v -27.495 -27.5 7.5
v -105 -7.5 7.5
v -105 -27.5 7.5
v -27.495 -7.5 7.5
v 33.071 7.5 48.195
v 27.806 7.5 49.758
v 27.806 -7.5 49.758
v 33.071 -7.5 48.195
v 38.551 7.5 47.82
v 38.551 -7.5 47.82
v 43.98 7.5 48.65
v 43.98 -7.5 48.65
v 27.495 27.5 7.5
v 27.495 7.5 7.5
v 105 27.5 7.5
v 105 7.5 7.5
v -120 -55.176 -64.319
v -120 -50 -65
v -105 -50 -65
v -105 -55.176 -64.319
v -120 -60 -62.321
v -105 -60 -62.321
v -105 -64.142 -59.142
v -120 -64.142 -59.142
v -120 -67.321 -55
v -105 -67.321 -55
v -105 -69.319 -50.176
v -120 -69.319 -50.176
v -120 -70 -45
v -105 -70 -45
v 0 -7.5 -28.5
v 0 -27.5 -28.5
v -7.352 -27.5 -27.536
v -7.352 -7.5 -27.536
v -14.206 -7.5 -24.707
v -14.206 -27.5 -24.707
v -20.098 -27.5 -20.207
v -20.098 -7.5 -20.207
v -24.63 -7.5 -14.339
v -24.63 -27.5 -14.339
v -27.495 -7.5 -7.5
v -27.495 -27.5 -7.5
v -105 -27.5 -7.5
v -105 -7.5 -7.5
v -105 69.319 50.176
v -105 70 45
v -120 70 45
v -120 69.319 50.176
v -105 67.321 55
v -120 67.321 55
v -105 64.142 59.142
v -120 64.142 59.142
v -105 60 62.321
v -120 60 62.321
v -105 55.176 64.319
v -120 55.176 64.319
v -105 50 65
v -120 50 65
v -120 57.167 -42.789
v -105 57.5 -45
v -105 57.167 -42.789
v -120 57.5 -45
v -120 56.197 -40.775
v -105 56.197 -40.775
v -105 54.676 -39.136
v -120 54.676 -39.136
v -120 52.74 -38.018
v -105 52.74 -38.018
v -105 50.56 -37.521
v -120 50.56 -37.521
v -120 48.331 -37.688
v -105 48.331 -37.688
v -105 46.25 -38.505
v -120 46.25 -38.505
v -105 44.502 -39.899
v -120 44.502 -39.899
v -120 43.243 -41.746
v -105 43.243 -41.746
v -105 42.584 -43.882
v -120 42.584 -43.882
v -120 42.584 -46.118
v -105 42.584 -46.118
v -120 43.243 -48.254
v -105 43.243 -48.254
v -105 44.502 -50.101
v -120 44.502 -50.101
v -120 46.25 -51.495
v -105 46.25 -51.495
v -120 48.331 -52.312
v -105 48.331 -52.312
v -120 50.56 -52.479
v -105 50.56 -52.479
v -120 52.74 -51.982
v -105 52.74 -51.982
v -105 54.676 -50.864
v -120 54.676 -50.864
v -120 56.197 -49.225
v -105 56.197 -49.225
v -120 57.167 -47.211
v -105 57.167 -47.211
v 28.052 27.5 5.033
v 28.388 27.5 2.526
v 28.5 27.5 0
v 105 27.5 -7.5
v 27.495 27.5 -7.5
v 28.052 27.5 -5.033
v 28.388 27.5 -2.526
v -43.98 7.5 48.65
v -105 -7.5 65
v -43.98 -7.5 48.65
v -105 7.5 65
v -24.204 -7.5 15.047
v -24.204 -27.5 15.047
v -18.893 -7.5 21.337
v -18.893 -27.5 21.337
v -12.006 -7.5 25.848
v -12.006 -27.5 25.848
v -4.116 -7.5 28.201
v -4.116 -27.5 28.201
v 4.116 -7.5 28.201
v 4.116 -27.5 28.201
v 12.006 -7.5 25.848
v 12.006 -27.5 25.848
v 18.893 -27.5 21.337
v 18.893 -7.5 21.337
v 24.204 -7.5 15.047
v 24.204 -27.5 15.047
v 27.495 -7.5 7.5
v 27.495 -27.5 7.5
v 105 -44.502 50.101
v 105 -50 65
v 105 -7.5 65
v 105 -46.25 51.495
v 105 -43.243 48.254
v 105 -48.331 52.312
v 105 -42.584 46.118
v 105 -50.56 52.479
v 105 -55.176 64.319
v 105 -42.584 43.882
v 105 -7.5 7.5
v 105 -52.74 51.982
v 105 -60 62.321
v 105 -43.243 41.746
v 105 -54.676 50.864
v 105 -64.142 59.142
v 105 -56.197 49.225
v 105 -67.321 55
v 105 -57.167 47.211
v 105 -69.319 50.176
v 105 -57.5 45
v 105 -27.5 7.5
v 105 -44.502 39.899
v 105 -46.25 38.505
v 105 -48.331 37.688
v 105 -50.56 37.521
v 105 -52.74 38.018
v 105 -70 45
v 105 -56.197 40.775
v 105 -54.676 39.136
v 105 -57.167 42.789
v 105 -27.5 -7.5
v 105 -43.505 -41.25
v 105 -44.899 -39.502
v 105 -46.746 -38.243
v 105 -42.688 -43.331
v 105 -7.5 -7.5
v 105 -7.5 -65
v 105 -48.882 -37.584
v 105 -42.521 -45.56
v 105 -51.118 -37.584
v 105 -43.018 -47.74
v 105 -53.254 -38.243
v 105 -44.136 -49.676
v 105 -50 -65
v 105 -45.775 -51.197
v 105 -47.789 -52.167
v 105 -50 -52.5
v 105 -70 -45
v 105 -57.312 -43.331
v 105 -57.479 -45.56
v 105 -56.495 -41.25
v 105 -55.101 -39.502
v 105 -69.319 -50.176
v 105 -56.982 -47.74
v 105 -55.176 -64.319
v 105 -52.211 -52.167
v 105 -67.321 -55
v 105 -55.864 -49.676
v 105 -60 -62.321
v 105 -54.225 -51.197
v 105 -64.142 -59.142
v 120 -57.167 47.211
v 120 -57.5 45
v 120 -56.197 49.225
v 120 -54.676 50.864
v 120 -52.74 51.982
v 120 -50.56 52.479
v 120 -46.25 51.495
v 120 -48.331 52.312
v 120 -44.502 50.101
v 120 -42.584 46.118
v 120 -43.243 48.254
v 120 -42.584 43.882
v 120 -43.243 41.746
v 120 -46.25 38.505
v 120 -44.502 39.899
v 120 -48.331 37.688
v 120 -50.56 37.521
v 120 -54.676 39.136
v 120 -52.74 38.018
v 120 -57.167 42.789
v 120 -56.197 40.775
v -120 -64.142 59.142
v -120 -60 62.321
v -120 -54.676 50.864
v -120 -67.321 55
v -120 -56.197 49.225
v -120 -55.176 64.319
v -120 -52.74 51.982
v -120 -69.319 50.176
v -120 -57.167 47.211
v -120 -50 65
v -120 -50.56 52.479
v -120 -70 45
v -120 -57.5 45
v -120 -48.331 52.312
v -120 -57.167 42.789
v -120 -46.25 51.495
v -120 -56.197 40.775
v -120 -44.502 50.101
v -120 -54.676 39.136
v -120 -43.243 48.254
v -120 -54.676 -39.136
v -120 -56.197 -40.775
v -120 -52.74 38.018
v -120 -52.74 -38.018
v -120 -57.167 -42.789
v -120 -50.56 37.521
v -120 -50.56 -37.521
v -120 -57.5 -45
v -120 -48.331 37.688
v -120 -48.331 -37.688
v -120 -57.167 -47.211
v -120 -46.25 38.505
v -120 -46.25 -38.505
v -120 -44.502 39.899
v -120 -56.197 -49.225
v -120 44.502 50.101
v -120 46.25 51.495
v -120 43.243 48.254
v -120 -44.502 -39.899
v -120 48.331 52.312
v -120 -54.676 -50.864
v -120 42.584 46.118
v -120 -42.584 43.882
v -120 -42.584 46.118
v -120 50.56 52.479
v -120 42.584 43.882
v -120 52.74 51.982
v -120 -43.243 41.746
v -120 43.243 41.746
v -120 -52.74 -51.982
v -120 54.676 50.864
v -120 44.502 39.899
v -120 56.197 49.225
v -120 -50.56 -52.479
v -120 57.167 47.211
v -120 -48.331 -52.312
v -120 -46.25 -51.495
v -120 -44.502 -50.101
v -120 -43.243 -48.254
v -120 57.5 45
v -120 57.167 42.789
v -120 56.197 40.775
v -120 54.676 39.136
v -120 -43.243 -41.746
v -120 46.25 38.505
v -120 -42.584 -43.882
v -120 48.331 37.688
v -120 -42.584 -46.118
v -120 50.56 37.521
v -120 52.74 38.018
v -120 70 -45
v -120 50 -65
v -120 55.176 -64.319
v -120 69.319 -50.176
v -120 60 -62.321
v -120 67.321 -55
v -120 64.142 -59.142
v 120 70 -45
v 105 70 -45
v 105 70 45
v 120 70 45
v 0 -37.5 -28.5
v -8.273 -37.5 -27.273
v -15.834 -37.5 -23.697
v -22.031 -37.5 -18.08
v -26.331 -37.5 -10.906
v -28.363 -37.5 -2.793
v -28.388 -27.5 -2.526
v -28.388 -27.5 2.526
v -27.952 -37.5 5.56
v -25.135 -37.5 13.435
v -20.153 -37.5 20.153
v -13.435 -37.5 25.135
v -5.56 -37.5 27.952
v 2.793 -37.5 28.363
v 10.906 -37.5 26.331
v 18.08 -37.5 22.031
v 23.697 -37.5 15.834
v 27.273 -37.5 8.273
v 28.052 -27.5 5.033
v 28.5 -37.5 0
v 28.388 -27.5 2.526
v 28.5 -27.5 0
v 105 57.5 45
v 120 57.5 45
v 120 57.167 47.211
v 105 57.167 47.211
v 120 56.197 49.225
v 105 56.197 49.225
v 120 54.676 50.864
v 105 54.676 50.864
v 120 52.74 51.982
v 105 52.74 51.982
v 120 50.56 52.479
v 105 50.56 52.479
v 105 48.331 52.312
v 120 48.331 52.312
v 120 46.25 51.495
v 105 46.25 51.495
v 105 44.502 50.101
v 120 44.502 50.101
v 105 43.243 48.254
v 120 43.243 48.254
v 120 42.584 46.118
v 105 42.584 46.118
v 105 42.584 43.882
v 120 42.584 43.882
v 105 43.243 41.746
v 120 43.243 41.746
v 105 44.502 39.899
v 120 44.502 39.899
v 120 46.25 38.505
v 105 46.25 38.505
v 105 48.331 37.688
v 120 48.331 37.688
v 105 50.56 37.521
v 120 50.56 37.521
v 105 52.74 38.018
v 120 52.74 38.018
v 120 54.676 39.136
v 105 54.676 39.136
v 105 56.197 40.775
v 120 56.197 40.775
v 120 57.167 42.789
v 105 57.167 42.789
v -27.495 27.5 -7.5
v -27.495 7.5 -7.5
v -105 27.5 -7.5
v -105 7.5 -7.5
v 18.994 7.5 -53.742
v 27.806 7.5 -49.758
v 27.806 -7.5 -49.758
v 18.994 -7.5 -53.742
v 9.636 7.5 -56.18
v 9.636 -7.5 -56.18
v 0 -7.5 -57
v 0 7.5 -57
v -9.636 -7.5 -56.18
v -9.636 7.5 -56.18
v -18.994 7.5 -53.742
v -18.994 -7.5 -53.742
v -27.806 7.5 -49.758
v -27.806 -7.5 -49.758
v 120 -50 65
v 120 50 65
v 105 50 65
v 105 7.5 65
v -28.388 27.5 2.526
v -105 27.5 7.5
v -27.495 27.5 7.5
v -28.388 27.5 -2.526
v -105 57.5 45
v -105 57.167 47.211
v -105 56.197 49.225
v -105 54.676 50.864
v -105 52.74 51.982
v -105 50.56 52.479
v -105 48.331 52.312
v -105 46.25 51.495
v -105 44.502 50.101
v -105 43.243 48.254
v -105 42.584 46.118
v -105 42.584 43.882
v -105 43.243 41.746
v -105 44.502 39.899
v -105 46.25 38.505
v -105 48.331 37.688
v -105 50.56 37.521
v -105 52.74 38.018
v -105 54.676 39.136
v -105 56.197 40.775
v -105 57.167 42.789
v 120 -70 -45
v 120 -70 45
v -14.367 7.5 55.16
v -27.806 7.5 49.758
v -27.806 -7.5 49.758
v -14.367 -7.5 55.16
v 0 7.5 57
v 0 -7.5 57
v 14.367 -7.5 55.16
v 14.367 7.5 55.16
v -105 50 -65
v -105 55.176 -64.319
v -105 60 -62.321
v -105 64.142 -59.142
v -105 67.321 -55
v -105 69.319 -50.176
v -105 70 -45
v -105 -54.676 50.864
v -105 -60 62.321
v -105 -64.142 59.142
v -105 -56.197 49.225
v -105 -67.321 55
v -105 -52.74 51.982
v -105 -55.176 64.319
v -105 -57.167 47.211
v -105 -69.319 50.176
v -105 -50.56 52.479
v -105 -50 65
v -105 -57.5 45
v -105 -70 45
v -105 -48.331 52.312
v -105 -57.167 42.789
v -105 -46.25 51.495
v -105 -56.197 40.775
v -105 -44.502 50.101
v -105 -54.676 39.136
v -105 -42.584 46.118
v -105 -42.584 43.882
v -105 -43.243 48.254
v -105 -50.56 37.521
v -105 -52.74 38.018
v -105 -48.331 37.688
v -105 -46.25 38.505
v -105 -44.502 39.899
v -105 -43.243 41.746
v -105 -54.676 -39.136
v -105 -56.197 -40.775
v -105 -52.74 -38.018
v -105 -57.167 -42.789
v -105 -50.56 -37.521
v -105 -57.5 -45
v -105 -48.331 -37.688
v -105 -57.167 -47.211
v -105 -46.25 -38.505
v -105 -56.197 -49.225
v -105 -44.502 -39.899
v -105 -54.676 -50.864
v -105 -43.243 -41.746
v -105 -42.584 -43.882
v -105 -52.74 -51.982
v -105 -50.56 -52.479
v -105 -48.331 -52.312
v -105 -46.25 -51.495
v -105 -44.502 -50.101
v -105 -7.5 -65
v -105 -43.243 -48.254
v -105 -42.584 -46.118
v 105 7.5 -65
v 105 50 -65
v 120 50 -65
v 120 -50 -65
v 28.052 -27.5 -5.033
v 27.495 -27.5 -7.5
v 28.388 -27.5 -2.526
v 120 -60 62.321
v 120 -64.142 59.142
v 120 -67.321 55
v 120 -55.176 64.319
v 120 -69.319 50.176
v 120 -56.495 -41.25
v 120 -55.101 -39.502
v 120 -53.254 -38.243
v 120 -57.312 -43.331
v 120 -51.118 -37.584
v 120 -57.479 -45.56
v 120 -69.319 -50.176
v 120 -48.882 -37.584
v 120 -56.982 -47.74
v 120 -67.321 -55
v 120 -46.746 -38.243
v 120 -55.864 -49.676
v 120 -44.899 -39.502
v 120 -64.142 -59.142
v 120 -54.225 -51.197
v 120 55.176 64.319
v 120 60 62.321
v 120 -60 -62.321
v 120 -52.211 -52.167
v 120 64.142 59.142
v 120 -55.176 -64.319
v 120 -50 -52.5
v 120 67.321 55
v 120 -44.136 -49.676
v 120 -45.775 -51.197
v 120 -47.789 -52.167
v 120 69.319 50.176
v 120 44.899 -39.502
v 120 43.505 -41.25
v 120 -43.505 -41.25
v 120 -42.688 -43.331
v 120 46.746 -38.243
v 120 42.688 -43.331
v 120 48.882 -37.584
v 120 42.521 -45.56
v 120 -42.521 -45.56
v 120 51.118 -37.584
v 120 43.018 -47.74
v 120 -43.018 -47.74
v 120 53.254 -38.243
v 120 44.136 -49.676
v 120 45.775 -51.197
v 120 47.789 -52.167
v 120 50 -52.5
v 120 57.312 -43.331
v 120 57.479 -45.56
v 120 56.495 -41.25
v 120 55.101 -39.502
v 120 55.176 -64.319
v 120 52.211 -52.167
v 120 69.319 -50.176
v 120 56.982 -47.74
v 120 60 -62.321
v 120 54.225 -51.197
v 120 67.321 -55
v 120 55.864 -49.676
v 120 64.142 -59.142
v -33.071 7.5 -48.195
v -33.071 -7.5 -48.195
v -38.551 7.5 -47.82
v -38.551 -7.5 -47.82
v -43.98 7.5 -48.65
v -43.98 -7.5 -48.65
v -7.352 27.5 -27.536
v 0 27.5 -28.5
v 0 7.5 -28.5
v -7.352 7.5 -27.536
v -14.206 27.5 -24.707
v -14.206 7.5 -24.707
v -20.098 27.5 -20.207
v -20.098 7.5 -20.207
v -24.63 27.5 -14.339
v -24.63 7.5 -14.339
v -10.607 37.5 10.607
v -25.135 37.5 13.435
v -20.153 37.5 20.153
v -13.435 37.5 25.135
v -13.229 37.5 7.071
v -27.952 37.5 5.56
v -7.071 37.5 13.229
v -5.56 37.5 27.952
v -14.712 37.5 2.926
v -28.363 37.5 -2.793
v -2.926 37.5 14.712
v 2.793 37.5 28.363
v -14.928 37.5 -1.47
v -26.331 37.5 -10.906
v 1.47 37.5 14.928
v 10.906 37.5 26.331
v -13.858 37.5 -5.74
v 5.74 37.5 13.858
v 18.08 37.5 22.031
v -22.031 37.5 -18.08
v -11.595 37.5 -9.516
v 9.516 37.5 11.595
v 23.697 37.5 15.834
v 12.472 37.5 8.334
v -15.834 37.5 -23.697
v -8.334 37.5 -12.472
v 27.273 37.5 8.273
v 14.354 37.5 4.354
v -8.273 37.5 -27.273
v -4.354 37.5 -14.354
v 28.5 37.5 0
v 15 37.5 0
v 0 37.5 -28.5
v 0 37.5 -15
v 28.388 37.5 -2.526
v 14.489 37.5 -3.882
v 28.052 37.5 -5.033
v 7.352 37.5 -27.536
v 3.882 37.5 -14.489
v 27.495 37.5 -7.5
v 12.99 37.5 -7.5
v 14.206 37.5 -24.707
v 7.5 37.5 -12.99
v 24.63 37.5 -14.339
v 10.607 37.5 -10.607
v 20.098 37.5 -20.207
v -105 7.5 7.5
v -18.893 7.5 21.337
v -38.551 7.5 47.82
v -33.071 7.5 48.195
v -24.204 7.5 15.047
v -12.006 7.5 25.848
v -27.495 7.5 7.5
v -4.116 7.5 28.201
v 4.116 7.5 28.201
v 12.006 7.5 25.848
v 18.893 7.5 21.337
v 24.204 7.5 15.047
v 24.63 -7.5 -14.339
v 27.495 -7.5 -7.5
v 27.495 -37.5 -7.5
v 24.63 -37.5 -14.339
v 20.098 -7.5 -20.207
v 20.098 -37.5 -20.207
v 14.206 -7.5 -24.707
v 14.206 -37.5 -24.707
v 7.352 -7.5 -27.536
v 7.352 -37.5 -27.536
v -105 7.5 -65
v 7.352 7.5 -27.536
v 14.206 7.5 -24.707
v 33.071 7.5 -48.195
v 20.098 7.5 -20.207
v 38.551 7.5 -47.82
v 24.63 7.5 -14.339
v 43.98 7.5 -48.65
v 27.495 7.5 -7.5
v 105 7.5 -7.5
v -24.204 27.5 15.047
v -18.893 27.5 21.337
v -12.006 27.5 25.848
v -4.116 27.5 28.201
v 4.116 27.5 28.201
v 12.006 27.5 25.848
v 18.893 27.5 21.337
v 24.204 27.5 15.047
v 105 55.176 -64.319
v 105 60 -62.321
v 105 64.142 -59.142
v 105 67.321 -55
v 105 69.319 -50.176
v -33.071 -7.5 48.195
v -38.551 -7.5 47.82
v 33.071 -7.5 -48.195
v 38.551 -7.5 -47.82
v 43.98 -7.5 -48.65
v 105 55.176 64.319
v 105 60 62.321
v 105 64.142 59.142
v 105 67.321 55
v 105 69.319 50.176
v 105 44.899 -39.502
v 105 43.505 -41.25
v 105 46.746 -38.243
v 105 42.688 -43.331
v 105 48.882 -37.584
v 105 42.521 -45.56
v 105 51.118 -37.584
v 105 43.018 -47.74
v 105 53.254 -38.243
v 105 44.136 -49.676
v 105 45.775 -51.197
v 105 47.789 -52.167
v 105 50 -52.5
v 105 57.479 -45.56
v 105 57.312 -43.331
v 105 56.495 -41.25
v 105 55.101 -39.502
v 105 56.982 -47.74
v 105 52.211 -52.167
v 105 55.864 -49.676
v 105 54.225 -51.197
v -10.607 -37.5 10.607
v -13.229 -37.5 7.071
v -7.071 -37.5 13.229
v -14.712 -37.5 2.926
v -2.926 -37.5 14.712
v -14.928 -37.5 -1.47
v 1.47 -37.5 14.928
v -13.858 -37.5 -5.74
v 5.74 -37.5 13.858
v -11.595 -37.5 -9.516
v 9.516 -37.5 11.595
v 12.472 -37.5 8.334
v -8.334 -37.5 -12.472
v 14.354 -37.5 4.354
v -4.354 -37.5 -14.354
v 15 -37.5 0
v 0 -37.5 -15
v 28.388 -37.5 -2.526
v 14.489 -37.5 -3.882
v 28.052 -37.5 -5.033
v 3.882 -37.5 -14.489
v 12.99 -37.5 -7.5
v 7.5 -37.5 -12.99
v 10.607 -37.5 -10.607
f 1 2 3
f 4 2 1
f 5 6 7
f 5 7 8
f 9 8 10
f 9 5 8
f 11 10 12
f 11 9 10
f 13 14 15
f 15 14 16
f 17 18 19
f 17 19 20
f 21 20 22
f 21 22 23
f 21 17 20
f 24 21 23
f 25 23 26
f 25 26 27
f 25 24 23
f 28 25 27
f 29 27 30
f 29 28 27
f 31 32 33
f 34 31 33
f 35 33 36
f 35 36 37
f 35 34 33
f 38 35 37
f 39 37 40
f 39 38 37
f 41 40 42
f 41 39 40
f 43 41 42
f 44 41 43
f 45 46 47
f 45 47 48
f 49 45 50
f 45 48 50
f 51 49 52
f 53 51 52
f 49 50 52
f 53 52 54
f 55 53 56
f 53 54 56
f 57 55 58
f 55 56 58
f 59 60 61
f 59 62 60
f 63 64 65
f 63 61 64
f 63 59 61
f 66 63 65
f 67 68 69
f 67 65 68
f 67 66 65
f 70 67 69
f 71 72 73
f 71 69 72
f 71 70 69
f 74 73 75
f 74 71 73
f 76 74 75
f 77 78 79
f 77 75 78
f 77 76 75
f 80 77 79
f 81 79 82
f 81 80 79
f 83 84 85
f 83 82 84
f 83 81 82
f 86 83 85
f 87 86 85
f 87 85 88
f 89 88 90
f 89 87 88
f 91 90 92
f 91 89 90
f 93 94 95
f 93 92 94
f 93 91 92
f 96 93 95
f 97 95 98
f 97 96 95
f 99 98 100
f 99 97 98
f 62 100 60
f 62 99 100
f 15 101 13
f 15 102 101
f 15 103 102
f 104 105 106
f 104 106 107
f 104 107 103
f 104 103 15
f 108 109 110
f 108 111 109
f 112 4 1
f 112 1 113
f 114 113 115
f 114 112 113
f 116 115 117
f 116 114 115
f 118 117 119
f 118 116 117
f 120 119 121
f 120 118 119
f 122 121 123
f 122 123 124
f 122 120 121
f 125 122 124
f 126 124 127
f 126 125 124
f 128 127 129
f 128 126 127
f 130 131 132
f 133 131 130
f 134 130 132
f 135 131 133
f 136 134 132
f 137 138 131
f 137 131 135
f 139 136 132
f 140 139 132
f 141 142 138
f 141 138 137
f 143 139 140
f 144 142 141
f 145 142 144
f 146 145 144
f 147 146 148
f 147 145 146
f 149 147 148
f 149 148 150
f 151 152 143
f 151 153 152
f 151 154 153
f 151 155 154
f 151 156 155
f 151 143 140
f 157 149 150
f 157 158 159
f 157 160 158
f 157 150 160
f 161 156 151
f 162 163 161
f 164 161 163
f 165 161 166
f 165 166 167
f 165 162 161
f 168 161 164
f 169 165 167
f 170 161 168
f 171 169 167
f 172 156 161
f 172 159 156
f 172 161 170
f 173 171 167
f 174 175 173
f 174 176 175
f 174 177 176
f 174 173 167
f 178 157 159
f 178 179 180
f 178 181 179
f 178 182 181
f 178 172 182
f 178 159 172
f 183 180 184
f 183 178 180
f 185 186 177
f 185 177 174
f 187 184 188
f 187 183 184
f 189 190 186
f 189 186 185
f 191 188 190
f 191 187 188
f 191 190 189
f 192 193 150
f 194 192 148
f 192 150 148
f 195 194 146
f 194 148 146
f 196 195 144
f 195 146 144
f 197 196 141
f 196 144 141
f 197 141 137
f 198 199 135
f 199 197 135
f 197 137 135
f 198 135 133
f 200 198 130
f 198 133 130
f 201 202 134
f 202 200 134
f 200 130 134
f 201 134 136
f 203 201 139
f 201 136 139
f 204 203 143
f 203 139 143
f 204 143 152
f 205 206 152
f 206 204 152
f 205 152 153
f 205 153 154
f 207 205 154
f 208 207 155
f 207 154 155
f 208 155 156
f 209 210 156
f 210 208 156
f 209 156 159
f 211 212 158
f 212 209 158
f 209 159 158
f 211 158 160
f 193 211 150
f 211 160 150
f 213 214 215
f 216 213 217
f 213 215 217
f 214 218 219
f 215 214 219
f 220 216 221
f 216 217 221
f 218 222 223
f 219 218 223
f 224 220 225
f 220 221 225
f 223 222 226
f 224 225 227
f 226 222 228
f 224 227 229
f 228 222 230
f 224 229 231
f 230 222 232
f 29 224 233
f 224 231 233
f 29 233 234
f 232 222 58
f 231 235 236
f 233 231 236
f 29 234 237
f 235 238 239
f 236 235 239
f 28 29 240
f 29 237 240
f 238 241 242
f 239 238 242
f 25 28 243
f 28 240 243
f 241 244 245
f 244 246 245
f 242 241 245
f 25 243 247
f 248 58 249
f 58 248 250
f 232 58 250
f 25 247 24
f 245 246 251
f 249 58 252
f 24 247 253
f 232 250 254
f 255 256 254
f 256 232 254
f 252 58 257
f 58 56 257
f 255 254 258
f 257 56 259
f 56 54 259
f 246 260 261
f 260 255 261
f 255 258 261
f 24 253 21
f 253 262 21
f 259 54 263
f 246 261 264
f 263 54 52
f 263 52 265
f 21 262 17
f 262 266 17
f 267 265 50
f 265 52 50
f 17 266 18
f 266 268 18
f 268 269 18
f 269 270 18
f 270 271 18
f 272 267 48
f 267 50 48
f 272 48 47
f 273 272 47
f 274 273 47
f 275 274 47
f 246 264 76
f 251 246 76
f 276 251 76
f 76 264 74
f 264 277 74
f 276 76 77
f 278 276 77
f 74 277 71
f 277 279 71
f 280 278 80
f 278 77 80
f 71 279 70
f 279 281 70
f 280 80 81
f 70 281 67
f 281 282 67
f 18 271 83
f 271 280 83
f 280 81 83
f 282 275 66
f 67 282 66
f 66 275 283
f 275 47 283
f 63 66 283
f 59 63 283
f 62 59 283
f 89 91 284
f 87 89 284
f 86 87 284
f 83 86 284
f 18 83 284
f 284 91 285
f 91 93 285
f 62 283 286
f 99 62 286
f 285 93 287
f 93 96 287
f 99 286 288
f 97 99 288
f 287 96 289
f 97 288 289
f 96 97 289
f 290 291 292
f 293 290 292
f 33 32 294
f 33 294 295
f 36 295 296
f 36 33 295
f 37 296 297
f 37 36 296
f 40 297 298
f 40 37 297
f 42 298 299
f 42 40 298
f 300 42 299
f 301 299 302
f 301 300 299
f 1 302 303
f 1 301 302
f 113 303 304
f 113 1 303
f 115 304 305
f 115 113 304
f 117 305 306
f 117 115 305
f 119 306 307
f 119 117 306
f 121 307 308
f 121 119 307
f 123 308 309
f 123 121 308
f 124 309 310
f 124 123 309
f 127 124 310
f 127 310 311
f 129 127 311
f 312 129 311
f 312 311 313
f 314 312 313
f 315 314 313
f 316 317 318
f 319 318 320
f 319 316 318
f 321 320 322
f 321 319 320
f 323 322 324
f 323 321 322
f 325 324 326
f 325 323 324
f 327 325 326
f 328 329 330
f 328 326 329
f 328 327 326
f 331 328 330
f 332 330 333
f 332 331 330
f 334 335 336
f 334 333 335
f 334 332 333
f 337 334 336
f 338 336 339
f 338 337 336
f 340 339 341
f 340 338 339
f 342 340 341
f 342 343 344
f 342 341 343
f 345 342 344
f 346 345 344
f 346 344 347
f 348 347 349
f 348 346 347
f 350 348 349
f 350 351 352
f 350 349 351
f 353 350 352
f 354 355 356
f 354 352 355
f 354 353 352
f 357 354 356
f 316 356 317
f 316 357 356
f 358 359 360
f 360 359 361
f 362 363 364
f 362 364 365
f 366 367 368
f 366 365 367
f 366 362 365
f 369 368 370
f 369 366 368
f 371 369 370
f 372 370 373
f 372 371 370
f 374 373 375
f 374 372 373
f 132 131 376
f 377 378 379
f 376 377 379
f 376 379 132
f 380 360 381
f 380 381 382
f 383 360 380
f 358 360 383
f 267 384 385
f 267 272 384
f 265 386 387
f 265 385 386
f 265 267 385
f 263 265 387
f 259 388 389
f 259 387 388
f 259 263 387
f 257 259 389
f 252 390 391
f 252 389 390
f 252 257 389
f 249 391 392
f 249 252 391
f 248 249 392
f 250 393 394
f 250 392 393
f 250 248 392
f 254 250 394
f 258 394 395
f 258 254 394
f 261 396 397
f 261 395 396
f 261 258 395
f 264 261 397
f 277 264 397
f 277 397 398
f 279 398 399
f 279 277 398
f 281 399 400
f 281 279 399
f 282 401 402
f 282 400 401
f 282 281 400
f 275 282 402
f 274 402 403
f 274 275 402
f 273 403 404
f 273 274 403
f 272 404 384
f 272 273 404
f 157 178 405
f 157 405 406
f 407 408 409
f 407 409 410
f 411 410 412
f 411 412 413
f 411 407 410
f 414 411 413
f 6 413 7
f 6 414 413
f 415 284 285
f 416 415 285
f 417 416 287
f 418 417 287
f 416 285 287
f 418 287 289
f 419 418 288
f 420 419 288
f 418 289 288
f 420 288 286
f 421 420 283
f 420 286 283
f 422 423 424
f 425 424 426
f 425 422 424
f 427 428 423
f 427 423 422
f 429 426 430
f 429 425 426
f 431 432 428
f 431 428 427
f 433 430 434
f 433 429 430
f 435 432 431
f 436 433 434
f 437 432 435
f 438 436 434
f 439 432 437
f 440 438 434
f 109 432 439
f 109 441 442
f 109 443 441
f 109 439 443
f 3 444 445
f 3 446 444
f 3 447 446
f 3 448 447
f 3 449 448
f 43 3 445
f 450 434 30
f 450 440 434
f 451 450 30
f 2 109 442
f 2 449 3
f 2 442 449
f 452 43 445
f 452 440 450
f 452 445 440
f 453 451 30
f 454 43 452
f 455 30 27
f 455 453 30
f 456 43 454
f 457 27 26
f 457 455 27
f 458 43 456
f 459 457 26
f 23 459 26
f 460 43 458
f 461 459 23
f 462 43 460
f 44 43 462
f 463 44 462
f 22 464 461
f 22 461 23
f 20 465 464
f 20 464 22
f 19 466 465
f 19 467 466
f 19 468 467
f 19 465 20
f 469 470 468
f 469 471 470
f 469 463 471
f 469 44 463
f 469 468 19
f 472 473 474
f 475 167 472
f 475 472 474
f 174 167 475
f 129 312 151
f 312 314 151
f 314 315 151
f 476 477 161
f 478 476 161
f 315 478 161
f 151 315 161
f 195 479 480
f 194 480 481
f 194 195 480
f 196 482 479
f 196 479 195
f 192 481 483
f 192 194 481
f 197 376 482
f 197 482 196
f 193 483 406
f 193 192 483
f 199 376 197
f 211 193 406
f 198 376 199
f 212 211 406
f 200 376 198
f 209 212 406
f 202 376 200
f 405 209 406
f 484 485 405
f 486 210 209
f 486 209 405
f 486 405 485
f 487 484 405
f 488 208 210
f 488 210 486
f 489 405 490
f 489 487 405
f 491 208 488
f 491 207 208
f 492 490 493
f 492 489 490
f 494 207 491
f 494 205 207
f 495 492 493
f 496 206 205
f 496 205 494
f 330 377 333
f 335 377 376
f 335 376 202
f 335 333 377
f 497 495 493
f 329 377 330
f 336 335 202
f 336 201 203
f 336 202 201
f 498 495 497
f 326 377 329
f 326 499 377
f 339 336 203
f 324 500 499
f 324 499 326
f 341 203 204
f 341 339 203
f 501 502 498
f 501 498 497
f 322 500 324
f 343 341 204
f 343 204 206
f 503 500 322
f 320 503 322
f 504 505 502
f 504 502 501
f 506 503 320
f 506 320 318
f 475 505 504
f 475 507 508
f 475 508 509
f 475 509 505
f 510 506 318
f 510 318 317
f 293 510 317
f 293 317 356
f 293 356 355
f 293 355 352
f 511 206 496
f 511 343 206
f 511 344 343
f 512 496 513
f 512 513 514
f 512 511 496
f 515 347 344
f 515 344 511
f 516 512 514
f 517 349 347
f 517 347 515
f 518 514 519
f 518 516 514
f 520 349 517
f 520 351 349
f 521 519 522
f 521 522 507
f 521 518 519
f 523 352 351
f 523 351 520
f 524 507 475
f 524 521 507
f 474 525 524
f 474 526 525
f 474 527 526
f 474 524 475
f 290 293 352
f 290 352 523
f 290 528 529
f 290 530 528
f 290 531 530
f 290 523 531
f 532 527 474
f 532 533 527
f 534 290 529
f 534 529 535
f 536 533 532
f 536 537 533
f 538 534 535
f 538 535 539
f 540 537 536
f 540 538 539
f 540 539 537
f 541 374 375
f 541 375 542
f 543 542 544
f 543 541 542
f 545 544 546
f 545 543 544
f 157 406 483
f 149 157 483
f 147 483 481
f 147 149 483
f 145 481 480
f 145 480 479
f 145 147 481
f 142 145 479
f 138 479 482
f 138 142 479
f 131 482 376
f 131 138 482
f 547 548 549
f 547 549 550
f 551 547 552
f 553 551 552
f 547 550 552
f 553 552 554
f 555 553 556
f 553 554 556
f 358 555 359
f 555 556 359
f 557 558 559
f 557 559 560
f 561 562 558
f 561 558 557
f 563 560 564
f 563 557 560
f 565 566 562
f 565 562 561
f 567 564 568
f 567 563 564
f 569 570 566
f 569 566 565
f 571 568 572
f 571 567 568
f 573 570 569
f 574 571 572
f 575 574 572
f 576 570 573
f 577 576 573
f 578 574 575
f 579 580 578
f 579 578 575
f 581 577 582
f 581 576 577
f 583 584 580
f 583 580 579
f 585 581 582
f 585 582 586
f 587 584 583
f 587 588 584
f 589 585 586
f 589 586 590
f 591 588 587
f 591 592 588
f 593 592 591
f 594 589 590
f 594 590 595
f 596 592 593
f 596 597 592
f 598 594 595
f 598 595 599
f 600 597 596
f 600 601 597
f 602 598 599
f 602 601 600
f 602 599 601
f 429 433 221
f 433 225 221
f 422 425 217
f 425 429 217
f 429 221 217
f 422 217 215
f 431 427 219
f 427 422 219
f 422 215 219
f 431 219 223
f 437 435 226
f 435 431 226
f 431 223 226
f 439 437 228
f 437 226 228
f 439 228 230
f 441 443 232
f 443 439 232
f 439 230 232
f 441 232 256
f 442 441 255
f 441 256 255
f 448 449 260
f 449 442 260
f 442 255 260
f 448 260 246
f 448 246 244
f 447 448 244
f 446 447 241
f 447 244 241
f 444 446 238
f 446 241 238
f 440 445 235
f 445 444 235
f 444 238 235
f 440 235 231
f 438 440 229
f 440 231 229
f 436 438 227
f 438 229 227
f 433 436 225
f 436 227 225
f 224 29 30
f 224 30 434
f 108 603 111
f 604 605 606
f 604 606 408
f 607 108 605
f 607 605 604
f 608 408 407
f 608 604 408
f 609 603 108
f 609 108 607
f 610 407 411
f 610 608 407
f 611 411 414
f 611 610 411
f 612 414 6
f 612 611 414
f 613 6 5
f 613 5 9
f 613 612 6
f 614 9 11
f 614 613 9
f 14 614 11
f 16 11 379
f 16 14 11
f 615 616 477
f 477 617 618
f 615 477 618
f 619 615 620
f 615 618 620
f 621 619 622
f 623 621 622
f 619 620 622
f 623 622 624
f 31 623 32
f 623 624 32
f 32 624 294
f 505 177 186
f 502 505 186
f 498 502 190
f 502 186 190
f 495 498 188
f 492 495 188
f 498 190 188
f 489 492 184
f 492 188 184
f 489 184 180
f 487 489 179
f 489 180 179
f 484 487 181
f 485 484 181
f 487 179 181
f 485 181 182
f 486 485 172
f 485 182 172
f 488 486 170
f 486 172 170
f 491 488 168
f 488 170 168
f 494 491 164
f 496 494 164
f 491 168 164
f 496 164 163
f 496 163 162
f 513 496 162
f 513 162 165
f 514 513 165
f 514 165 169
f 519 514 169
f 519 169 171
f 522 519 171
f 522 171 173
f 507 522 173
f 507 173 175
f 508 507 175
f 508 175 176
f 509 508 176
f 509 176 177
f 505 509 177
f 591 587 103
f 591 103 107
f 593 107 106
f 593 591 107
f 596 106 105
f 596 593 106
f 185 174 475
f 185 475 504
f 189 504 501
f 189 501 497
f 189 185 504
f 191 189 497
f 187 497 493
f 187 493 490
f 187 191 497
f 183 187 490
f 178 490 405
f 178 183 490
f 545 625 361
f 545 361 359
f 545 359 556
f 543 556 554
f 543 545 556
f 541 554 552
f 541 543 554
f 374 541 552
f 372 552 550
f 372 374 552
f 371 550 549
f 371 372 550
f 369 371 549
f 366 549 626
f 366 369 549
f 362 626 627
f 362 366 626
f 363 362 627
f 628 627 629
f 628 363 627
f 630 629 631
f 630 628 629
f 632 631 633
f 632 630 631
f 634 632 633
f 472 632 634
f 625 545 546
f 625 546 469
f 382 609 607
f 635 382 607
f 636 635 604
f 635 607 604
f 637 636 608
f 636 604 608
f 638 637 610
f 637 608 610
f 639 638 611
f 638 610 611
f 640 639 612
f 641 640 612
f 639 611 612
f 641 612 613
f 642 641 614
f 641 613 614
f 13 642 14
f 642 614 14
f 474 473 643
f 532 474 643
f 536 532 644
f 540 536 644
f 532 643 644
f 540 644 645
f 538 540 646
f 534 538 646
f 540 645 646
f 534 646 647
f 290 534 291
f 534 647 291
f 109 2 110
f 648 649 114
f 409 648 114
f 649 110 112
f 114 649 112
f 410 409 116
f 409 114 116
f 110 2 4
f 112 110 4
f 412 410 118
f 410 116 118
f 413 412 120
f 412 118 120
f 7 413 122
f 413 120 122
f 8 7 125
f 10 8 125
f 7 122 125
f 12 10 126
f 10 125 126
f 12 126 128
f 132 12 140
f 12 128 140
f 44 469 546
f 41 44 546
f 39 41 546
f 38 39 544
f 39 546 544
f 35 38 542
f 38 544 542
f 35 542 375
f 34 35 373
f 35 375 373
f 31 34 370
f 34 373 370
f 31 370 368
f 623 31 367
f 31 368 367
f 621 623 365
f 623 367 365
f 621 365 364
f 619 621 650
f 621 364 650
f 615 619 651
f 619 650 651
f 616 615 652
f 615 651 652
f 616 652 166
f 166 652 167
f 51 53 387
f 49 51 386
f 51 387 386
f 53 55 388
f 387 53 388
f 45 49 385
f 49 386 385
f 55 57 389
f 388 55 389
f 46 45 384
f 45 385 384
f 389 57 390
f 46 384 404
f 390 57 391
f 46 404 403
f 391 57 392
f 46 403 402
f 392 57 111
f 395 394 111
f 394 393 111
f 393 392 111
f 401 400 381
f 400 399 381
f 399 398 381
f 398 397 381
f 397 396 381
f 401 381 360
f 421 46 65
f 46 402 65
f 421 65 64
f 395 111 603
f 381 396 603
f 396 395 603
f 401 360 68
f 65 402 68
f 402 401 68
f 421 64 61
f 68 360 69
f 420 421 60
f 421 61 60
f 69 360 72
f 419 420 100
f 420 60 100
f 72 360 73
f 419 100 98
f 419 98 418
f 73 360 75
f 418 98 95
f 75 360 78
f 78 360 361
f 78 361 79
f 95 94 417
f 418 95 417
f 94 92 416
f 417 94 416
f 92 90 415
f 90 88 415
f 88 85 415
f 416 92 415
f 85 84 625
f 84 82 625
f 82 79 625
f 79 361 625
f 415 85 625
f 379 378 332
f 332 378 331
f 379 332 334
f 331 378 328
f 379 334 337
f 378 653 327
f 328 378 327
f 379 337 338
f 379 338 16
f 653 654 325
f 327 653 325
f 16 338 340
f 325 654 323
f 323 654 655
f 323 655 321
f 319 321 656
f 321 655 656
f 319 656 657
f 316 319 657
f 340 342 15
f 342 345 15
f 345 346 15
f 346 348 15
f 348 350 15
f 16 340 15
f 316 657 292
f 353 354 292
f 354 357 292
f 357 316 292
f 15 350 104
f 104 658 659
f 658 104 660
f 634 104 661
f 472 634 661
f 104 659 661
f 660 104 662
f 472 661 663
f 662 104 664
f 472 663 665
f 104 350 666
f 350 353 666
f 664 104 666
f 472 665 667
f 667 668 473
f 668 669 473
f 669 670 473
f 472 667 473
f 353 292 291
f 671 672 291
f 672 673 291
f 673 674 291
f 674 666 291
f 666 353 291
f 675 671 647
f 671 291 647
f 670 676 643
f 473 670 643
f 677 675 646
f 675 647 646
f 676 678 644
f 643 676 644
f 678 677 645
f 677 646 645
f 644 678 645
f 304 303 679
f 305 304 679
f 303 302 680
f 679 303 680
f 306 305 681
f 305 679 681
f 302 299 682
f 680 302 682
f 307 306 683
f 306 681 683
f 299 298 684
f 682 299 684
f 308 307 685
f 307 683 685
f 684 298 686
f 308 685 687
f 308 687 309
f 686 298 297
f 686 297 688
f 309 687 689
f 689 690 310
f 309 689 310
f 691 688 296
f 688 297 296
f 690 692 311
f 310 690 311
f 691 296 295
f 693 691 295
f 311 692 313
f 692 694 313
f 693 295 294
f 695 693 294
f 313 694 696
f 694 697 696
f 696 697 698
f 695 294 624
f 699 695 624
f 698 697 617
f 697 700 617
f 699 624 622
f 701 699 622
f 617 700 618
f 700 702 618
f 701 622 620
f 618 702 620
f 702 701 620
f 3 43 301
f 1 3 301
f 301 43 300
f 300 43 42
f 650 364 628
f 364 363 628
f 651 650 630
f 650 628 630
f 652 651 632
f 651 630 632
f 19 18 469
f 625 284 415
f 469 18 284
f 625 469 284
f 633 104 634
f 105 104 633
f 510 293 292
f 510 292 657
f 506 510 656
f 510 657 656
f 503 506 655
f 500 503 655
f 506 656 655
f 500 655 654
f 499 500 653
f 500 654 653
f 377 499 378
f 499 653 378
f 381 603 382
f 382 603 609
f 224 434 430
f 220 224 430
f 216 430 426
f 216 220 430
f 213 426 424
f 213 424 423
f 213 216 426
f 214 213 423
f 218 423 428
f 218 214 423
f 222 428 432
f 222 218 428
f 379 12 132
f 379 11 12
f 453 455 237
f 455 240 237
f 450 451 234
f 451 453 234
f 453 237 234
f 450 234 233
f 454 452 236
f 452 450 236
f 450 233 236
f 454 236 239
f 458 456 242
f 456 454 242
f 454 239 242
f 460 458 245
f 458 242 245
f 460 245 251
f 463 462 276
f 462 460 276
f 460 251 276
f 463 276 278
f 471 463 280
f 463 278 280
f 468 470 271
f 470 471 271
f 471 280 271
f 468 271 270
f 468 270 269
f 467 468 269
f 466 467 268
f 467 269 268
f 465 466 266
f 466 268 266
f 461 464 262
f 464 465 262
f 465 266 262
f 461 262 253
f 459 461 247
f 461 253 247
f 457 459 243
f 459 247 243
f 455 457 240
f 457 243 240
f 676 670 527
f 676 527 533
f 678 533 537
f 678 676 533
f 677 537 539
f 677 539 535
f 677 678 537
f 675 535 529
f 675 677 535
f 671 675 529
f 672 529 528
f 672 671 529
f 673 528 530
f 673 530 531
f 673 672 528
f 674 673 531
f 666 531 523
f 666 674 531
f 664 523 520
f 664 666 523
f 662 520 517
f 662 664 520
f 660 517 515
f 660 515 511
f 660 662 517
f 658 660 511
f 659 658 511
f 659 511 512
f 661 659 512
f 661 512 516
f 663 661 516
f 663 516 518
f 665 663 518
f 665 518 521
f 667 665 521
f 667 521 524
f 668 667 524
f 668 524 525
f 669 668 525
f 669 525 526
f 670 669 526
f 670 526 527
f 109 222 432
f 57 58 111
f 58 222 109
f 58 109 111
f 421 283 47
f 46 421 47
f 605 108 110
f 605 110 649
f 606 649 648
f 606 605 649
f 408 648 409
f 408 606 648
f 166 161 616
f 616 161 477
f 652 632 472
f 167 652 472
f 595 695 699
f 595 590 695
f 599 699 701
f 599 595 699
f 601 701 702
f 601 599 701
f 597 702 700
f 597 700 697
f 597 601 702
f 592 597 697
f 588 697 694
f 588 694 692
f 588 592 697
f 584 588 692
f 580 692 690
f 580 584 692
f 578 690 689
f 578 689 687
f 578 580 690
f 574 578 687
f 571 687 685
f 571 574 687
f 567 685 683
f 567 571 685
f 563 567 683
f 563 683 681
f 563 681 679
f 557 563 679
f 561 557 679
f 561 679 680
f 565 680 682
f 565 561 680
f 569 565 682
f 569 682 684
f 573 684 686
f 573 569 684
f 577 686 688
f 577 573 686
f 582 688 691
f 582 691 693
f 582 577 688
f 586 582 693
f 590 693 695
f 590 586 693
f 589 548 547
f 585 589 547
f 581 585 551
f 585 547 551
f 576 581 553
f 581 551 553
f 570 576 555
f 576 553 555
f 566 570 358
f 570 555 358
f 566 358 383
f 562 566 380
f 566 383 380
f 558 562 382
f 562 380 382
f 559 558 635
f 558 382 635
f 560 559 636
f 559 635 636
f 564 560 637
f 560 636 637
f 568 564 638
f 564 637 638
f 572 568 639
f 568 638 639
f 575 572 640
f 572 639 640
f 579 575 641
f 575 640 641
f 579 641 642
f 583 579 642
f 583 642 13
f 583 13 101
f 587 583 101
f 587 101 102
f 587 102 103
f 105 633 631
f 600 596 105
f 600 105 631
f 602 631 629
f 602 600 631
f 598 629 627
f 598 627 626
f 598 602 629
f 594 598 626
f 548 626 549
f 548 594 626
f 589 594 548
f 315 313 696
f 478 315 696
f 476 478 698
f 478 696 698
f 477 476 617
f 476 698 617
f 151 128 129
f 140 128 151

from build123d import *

# Parameters (mm, degrees)
BOSS_EXTRUDE1_DEPTH   = 7.5
CUT_EXTRUDE1_DEPTH    = 124.718430317
BOSS_EXTRUDE2_START   = 37.5
BOSS_EXTRUDE2_DEPTH   = 37.5
BOSS_EXTRUDE3_START   = 27.5
BOSS_EXTRUDE3_DEPTH   = 27.5
SKETCH4_R             = 7.5
BOSS_EXTRUDE4_DEPTH   = 15
MIRROR1_DEPTH         = 27.5
MIRROR1_2_DEPTH       = 7.5
MIRROR1_START         = 27.5
MIRROR1_3_OUTLINE_W   = 15
MIRROR1_3_OUTLINE_H   = 130
MIRROR1_3_OUTLINE_H_2 = 65
MIRROR1_3_DEPTH       = 14.9999999
MIRROR1_4_DEPTH       = 10
MIRROR1_START_2       = -120
MIRROR1_5_OUTLINE_R   = 7.5
MIRROR1_5_DEPTH       = 15
MIRROR1_START_3       = 105
MIRROR1_6_OUTLINE_R   = 7.5
MIRROR1_6_DEPTH       = 15


with BuildPart() as part:
    # Sketch1 → Boss-Extrude1 (new body)
    with BuildSketch(Plane(origin=(0, 0, 0), x_dir=(1, 0, 0), z_dir=(0, 1, 0))):
        with BuildLine():
            Line((43.979733232, 48.649668798), (105, 65))
            Line((105, 65), (105, 0))
            Line((105, 0), (0, 0))
            Line((0, 0), (0, 57))
            ThreePointArc((0, 57), (14.366743308, 55.159737914), (27.805817387, 49.757778482))
            ThreePointArc((27.805817387, 49.757778482), (35.800459234, 47.856282629), (43.979733232, 48.649668798))
        make_face()
    extrude(amount=BOSS_EXTRUDE1_DEPTH)

    # Sketch2 → Cut-Extrude1 (cut, through all)
    with BuildSketch(Plane(origin=(0, 7.5, 0), x_dir=(1, 0, 0), z_dir=(0, 1, 0))):
        with BuildLine():
            Line((0, 15), (0, 0))
            Line((0, 0), (15, 0))
            ThreePointArc((15, 0), (10.606601718, 10.606601718), (0, 15))
        make_face()
    extrude(amount=-CUT_EXTRUDE1_DEPTH, mode=Mode.SUBTRACT)

    # Sketch3 → Boss-Extrude2 (add)
    with BuildSketch(Plane(origin=(0, 0, 0), x_dir=(1, 0, 0), z_dir=(0, 1, 0)).offset(BOSS_EXTRUDE2_START)):
        with BuildLine():
            ThreePointArc((28.5, 0), (28.247747201, 3.783487555), (27.49545417, 7.5))
            ThreePointArc((27.49545417, 7.5), (17.298843892, 22.649503306), (0, 28.5))
            Line((0, 28.5), (0, 15))
            ThreePointArc((0, 15), (10.606601718, 10.606601718), (15, 0))
            Line((15, 0), (28.5, 0))
        make_face()
    extrude(amount=-BOSS_EXTRUDE2_DEPTH)

    # Sketch3<4> → Boss-Extrude3 (add)
    with BuildSketch(Plane(origin=(0, 0, 0), x_dir=(1, 0, 0), z_dir=(0, 1, 0)).offset(BOSS_EXTRUDE3_START)):
        with BuildLine():
            Line((105, 7.5), (27.49545417, 7.5))
            ThreePointArc((27.49545417, 7.5), (28.247747201, 3.783487555), (28.5, 0))
            Line((28.5, 0), (105, 0))
            Line((105, 0), (105, 7.5))
        make_face()
    extrude(amount=-BOSS_EXTRUDE3_DEPTH)

    # Sketch4 → Boss-Extrude4 (add)
    with BuildSketch(Plane(origin=(105, 0, 0), x_dir=(0, 0, -1), z_dir=(1, 0, 0))):
        with BuildLine():
            Line((0, 0), (65, 0))
            Line((65, 0), (65, 50))
            ThreePointArc((65, 50), (59.142135624, 64.142135624), (45, 70))
            Line((45, 70), (0, 70))
            Line((0, 70), (0, 0))
        make_face()
        with Locations((45, 50)):
            Circle(SKETCH4_R, mode=Mode.SUBTRACT)
    extrude(amount=BOSS_EXTRUDE4_DEPTH)

    # Mirror1: read off the stored shape, not the designer's step
    # Mirror1 outline → Mirror1 (add)
    with BuildSketch(Plane(origin=(0, 0, 0), x_dir=(1, 0, 0), z_dir=(0, 1, 0))):
        with BuildLine():
            Line((0, 15), (0, 28.5))
            ThreePointArc((0, 28.5), (-17.298843892, 22.649503306), (-27.49545417, 7.5))
            Line((-27.49545417, 7.5), (-105, 7.5))
            Line((-105, 7.5), (-105, 65))
            Line((-105, 65), (-120, 65))
            Line((-120, 65), (-120, -65))
            Line((-120, -65), (-105, -65))
            Line((-105, -65), (-105, -7.5))
            Line((-105, -7.5), (-27.49545417, -7.5))
            ThreePointArc((-27.49545417, -7.5), (0, -28.5), (27.49545417, -7.5))
            Line((27.49545417, -7.5), (105, -7.5))
            Line((105, -7.5), (105, -65))
            Line((105, -65), (120, -65))
            Line((120, -65), (120, 0))
            Line((120, 0), (15, 0))
            ThreePointArc((15, 0), (-10.606601718, -10.606601718), (0, 15))
        make_face()
    extrude(amount=MIRROR1_DEPTH)

    # Mirror1 2 outline → Mirror1 2 (add)
    with BuildSketch(Plane(origin=(0, 0, 0), x_dir=(1, 0, 0), z_dir=(0, 1, 0))):
        with BuildLine():
            ThreePointArc((0, 57), (-14.366743308, 55.159737914), (-27.805817387, 49.757778482))
            ThreePointArc((-27.805817387, 49.757778482), (-35.800459234, 47.856282629), (-43.979733232, 48.649668798))
            Line((-43.979733232, 48.649668798), (-105, 65))
            Line((-105, 65), (-105, 7.5))
            Line((-105, 7.5), (-27.49545417, 7.5))
            ThreePointArc((-27.49545417, 7.5), (-17.298843892, 22.649503306), (0, 28.5))
            Line((0, 28.5), (0, 57))
        make_face()
        with BuildLine():
            Line((105, -7.5), (27.49545417, -7.5))
            ThreePointArc((27.49545417, -7.5), (0, -28.5), (-27.49545417, -7.5))
            Line((-27.49545417, -7.5), (-105, -7.5))
            Line((-105, -7.5), (-105, -65))
            Line((-105, -65), (-43.979733232, -48.649668798))
            ThreePointArc((-43.979733232, -48.649668798), (-35.800459234, -47.856282629), (-27.805817387, -49.757778482))
            ThreePointArc((-27.805817387, -49.757778482), (0, -57), (27.805817387, -49.757778482))
            ThreePointArc((27.805817387, -49.757778482), (35.800459234, -47.856282629), (43.979733232, -48.649668798))
            Line((43.979733232, -48.649668798), (105, -65))
            Line((105, -65), (105, -7.5))
        make_face()
    extrude(amount=MIRROR1_2_DEPTH)

    # Mirror1 3 outline → Mirror1 3 (add)
    with BuildSketch(Plane(origin=(0, 0, 0), x_dir=(1, 0, 0), z_dir=(0, 1, 0)).offset(MIRROR1_START)):
        with Locations((-112.5, 0)):
            Rectangle(MIRROR1_3_OUTLINE_W, MIRROR1_3_OUTLINE_H)
        with Locations((112.5, -32.5)):
            Rectangle(MIRROR1_3_OUTLINE_W, MIRROR1_3_OUTLINE_H_2)
    extrude(amount=MIRROR1_3_DEPTH)

    # Mirror1 4 outline → Mirror1 4 (add)
    with BuildSketch(Plane(origin=(0, 0, 0), x_dir=(1, 0, 0), z_dir=(0, 1, 0)).offset(MIRROR1_START)):
        with BuildLine():
            Line((0, 15), (0, 28.5))
            ThreePointArc((0, 28.5), (-20.152543264, -20.152543264), (28.5, 0))
            Line((28.5, 0), (15, 0))
            ThreePointArc((15, 0), (-10.606601718, -10.606601718), (0, 15))
        make_face()
    extrude(amount=MIRROR1_4_DEPTH)

    # Mirror1 5 outline → Mirror1 5 (add)
    with BuildSketch(Plane.YZ.offset(MIRROR1_START_2)):
        with BuildLine():
            Line((7.5, -7.5), (7.5, -65))
            Line((7.5, -65), (50, -65))
            ThreePointArc((50, -65), (64.142135624, -59.142135624), (70, -45))
            Line((70, -45), (70, 45))
            ThreePointArc((70, 45), (64.142135624, 59.142135624), (50, 65))
            Line((50, 65), (7.5, 65))
            Line((7.5, 65), (7.5, 7.5))
            Line((7.5, 7.5), (27.5, 7.5))
            Line((27.5, 7.5), (27.5, -7.5))
            Line((27.5, -7.5), (7.5, -7.5))
        make_face()
        with Locations((50, -45)):
            Circle(MIRROR1_5_OUTLINE_R, mode=Mode.SUBTRACT)
        with Locations((50, 45)):
            Circle(MIRROR1_5_OUTLINE_R, mode=Mode.SUBTRACT)
    extrude(amount=MIRROR1_5_DEPTH)

    # Mirror1 6 outline → Mirror1 6 (add)
    with BuildSketch(Plane.YZ.offset(MIRROR1_START_3)):
        with BuildLine():
            Line((7.5, -7.5), (7.5, -65))
            Line((7.5, -65), (50, -65))
            ThreePointArc((50, -65), (64.142135624, -59.142135624), (70, -45))
            Line((70, -45), (70, 45))
            ThreePointArc((70, 45), (64.142135624, 59.142135624), (50, 65))
            Line((50, 65), (7.5, 65))
            Line((7.5, 65), (7.5, 7.5))
            Line((7.5, 7.5), (27.5, 7.5))
            Line((27.5, 7.5), (27.5, -7.5))
            Line((27.5, -7.5), (7.5, -7.5))
        make_face()
        with Locations((50, -45)):
            Circle(MIRROR1_6_OUTLINE_R, mode=Mode.SUBTRACT)
        with Locations((50, 45)):
            Circle(MIRROR1_6_OUTLINE_R, mode=Mode.SUBTRACT)
    extrude(amount=MIRROR1_6_DEPTH)

    # Mirror2: part across face


with BuildPart() as part_1:
    add(part.part)
    add(part.part.mirror(Plane(origin=(0, 0, 0), x_dir=(0, 0, 1), z_dir=(0, -1, 0))))


solid = part_1.part
